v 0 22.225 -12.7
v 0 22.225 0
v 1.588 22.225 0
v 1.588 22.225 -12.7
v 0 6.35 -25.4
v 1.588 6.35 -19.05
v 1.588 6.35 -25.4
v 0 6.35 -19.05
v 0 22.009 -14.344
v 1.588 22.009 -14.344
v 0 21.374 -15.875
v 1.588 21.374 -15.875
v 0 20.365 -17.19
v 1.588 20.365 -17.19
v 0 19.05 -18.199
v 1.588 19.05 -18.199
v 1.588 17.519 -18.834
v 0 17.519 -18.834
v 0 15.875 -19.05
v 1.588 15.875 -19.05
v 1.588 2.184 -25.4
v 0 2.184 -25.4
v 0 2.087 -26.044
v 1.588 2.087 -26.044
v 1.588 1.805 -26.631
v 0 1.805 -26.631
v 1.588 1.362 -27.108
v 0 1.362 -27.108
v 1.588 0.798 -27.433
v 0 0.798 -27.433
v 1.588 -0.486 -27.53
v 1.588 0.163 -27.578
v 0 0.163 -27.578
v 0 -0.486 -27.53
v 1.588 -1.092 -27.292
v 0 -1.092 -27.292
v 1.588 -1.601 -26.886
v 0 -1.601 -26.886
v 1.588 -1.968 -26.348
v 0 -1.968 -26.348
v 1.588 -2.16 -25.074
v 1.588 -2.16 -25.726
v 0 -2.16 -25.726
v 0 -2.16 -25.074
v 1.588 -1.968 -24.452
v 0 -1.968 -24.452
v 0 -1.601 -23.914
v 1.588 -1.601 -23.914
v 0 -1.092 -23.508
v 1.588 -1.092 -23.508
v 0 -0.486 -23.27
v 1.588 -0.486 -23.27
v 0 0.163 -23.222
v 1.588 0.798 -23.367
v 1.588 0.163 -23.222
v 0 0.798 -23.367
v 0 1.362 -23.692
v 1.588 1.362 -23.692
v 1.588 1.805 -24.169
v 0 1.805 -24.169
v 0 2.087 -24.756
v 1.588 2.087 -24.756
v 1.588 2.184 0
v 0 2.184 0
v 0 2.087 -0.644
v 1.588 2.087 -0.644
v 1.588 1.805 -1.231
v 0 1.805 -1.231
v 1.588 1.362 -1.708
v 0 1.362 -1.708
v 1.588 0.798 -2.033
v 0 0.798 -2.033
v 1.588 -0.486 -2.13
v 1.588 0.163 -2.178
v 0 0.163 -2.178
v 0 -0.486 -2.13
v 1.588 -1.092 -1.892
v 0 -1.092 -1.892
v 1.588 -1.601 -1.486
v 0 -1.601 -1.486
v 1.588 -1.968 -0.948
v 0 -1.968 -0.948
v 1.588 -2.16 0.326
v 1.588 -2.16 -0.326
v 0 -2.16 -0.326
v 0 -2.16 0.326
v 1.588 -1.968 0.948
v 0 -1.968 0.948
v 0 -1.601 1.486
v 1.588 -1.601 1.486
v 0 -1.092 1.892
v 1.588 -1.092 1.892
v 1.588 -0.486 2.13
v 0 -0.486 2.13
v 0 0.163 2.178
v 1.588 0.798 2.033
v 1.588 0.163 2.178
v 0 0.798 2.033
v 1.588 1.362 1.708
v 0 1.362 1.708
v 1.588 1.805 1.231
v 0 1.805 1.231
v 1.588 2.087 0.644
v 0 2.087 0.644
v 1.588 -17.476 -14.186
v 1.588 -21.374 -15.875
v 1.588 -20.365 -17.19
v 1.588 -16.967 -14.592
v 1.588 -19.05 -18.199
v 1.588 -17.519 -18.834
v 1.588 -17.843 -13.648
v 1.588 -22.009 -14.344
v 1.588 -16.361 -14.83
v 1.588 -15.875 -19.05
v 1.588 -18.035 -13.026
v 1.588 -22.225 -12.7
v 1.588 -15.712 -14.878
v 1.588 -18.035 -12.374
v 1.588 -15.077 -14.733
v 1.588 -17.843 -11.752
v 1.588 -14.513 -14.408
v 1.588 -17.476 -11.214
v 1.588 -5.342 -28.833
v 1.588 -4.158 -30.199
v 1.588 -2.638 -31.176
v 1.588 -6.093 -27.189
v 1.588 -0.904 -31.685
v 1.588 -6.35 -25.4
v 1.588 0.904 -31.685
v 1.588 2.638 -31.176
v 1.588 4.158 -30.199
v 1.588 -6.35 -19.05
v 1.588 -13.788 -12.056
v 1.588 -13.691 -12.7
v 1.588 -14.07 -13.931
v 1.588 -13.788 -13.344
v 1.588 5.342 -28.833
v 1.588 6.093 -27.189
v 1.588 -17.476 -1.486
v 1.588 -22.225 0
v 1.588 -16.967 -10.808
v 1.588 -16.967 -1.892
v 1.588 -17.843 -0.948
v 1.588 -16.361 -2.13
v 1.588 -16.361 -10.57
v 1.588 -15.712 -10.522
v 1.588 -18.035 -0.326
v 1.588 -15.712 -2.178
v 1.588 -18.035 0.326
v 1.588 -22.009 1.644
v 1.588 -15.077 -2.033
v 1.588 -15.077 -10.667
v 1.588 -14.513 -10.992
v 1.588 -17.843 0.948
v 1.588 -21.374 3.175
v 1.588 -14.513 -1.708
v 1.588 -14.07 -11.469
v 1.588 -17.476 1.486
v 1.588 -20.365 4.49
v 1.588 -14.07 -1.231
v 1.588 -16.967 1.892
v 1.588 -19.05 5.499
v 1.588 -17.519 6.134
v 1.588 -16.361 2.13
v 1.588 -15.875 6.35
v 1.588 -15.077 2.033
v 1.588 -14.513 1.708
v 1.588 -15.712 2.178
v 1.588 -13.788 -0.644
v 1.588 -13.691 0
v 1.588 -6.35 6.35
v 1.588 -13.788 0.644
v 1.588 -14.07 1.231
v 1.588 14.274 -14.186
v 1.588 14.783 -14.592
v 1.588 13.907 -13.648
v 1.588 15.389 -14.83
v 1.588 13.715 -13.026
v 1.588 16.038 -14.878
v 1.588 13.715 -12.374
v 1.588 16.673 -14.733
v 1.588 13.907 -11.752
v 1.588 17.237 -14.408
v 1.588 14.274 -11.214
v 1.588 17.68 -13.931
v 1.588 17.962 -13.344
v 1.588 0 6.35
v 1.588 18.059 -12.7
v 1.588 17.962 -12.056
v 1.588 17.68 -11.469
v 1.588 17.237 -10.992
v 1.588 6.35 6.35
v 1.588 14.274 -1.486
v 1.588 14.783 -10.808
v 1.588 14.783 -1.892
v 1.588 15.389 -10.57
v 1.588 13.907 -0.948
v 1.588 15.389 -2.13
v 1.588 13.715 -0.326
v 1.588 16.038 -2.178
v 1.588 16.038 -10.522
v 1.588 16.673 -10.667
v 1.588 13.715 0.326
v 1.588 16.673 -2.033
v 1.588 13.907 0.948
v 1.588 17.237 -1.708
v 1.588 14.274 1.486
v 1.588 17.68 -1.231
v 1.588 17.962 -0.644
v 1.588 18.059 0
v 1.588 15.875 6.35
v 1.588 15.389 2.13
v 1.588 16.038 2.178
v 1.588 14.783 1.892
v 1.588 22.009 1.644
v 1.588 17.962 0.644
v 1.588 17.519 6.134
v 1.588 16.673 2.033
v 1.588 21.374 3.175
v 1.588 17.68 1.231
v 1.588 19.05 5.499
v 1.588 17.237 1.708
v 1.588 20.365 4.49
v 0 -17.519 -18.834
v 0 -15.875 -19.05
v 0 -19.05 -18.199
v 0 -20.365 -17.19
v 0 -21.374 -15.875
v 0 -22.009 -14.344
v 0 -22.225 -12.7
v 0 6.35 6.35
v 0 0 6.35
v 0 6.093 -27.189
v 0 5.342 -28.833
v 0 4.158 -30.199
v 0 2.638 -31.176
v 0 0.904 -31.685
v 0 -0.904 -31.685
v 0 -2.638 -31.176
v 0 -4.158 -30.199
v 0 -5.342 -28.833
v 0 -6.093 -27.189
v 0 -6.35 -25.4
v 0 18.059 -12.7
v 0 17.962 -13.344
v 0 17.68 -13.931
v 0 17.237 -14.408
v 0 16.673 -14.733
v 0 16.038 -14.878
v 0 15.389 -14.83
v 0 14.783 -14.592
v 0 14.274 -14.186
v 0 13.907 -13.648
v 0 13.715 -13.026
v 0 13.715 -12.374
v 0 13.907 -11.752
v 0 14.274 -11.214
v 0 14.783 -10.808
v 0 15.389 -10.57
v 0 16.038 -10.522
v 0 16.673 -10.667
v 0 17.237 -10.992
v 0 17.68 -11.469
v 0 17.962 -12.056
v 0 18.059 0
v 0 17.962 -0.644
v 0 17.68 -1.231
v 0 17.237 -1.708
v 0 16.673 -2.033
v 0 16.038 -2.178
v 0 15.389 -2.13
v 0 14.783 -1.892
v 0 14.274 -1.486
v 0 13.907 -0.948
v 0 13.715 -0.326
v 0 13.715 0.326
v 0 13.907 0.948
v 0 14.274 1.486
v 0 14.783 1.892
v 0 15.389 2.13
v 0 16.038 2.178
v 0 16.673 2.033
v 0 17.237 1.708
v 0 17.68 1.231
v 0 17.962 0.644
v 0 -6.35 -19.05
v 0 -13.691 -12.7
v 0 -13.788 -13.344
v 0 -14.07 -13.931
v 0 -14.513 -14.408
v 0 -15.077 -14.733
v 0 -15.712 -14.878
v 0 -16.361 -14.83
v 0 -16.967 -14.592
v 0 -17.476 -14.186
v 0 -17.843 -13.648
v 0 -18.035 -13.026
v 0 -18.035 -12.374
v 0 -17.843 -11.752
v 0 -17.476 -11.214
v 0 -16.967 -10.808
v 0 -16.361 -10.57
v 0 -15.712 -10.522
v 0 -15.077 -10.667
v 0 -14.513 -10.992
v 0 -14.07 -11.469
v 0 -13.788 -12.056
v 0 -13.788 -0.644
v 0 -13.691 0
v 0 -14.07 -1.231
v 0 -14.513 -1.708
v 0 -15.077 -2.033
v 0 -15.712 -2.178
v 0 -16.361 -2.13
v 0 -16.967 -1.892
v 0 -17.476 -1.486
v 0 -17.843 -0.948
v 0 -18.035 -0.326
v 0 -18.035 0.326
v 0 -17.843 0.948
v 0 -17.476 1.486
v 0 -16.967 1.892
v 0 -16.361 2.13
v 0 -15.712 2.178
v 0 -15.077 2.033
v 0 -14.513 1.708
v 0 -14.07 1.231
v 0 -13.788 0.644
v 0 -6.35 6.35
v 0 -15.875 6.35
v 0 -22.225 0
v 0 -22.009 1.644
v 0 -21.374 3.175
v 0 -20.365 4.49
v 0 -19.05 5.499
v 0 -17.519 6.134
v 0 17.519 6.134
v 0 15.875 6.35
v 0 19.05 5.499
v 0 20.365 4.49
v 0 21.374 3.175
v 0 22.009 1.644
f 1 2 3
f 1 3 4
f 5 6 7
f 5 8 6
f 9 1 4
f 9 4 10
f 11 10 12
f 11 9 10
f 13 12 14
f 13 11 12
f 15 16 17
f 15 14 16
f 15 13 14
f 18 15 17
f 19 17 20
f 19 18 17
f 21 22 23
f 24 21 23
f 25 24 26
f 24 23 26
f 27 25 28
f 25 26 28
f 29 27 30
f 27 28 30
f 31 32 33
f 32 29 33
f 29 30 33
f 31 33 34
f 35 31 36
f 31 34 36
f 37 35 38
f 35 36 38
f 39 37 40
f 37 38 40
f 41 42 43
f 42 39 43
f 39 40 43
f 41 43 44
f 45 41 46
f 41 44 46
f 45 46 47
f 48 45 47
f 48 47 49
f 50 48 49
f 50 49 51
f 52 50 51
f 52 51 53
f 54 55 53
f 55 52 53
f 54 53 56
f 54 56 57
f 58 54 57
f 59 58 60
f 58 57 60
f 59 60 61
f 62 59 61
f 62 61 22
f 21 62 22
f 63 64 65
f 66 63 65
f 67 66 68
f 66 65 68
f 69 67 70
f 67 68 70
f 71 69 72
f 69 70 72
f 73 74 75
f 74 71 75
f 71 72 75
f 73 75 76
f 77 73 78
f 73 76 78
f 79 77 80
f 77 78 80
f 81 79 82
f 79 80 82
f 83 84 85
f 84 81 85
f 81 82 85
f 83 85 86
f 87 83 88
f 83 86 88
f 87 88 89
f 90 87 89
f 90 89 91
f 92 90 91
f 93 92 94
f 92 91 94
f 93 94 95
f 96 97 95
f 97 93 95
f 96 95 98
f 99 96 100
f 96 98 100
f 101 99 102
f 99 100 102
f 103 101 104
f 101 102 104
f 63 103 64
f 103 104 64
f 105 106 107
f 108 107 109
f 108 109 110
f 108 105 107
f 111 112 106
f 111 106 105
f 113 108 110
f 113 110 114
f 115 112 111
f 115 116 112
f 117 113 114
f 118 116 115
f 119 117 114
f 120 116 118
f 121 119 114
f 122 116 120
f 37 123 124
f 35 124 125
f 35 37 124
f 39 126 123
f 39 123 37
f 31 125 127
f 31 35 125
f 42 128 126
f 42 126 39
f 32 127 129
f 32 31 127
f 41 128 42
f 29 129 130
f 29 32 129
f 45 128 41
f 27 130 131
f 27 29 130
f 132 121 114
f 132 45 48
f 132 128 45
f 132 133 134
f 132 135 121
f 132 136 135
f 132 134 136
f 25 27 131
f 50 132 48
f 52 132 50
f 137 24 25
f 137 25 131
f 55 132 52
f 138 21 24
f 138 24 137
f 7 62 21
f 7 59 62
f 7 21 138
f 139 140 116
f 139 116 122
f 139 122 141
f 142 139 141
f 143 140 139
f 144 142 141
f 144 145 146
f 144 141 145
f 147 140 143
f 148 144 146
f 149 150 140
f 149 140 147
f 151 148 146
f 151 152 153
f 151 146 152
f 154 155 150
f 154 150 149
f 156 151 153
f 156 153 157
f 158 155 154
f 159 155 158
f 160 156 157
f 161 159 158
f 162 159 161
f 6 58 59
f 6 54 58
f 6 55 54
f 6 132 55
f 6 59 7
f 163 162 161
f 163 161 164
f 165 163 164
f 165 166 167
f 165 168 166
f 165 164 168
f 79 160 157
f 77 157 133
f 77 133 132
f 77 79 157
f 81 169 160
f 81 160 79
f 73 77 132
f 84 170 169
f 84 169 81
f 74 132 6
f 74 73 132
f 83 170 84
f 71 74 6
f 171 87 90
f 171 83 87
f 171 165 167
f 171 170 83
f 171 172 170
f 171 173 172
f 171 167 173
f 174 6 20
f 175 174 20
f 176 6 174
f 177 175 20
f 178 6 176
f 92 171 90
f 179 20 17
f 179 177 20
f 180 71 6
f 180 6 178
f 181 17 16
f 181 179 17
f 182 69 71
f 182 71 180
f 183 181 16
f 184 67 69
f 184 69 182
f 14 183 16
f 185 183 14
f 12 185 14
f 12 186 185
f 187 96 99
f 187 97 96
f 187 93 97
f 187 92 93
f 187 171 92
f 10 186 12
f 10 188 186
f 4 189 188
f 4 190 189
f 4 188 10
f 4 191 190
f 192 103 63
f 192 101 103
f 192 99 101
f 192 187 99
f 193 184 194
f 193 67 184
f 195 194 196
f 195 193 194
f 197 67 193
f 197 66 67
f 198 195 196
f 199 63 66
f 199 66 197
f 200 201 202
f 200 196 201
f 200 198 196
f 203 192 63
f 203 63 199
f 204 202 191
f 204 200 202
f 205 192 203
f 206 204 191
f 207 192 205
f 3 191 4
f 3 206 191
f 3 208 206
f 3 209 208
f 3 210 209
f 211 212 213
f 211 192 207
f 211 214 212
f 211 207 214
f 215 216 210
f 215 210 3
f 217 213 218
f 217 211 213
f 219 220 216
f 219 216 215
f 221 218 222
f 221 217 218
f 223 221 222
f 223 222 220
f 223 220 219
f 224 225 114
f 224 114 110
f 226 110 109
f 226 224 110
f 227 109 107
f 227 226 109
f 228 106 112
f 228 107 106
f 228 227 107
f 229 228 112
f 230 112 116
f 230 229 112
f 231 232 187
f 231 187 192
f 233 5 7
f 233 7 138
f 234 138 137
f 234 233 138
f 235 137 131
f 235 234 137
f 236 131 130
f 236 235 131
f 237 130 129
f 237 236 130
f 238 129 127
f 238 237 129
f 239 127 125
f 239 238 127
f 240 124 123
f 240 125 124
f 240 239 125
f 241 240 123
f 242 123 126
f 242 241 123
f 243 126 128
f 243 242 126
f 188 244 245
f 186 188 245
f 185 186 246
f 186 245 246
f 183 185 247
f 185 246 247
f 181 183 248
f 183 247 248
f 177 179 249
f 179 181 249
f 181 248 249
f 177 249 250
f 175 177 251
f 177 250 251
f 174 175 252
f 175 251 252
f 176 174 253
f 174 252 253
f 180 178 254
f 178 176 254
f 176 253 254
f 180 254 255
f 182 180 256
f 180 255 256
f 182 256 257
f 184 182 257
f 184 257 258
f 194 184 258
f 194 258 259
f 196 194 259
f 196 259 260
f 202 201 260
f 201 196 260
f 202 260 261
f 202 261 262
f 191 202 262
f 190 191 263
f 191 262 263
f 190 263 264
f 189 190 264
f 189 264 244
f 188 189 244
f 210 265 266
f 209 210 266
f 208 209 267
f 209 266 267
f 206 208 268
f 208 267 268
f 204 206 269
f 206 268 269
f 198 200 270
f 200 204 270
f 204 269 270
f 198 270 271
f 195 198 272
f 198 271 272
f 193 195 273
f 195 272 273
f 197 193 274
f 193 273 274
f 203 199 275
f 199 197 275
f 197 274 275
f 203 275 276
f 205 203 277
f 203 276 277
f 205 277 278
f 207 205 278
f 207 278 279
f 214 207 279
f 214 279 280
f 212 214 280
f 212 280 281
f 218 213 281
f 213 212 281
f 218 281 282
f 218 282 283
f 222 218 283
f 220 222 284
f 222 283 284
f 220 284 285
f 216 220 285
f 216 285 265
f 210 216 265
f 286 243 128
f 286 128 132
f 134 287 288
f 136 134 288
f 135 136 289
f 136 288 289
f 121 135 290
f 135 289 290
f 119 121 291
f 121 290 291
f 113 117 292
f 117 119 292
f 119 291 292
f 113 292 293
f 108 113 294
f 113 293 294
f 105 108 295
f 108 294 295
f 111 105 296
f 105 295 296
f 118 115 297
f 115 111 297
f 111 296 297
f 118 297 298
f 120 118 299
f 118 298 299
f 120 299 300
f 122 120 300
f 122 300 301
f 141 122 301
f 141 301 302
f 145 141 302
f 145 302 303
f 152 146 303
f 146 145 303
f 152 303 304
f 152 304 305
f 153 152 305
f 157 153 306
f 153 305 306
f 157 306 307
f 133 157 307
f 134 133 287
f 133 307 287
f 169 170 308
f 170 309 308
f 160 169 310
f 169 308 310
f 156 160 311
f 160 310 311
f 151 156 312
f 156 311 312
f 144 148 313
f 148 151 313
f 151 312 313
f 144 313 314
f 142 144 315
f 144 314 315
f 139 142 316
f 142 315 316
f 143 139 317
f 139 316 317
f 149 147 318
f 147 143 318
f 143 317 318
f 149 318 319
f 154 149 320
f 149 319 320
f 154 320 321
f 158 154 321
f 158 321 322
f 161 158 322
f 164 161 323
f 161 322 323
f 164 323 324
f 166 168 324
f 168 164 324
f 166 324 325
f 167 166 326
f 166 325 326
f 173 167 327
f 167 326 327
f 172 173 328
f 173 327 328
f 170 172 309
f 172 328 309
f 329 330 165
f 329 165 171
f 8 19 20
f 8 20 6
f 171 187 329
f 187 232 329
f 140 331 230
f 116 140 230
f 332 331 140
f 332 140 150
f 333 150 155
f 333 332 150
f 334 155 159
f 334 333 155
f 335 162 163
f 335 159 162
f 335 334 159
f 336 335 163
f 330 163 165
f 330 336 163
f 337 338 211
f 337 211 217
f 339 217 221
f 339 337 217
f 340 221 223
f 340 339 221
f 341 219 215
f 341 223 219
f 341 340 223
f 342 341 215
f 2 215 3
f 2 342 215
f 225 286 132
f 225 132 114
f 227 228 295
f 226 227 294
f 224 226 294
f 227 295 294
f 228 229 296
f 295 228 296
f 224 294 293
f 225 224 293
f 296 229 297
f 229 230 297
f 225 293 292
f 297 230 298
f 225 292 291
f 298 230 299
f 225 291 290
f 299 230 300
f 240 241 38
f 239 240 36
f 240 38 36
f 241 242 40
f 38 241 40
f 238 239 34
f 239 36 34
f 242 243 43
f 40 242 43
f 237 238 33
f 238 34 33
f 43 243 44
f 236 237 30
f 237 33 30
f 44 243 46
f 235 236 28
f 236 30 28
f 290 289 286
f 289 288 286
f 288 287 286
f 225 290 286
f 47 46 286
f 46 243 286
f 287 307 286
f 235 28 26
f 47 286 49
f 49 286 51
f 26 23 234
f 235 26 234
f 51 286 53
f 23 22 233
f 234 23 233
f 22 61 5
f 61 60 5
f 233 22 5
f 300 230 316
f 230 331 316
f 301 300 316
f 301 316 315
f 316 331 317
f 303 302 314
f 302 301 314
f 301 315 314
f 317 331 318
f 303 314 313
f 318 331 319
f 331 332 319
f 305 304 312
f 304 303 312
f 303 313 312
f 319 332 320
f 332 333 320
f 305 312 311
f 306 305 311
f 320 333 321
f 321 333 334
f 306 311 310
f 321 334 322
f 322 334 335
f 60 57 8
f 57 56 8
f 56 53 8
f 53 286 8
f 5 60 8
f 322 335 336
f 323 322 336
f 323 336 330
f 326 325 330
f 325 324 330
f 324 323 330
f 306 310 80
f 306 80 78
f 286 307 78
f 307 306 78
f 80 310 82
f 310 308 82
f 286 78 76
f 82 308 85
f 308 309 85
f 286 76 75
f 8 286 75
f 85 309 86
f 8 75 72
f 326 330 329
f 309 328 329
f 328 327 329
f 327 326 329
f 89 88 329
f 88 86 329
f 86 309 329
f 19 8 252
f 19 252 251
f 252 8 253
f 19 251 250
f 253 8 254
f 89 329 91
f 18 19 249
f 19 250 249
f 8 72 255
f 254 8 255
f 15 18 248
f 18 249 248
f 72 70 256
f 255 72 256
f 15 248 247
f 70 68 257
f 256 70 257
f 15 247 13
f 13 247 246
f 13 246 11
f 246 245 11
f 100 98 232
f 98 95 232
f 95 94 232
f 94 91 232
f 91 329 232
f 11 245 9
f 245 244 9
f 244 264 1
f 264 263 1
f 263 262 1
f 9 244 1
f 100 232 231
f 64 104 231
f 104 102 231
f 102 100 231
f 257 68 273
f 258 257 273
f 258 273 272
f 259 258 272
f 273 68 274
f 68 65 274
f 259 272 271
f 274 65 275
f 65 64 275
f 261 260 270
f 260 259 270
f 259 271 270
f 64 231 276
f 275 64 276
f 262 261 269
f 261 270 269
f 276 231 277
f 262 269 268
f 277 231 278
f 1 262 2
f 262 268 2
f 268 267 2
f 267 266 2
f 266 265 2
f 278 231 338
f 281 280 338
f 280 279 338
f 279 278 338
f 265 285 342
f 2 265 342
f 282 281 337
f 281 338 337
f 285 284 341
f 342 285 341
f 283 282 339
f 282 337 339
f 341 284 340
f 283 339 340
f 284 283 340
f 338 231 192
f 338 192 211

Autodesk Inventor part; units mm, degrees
ref_plane "YZ Plane" through (0, 0, 0) normal (1, 0, 0) x (0, 1, 0)
ref_plane "XZ Plane" through (0, 0, 0) normal (0, 1, 0) x (-1, 0, 0)
ref_plane "XY Plane" through (0, 0, 0) normal (0, 0, 1) x (1, 0, 0)
sketch "Sketch1" plane through (0, 0, 0) normal (1, 0, 0) x (0, 1, 0)
  arc A0 (-6.35, -25.4) -> (6.35, -25.4) centre (0, -25.4) ccw
  line L0 (-6.35, -19.05) -> (-15.875, -19.05)
  circle A1 centre (-15.875, -12.7) radius 2.1844
  arc A2 (-22.225, -12.7) -> (-15.875, -19.05) centre (-15.875, -12.7) ccw
  line L1 (-6.35, -25.4) -> (-6.35, -19.05)
  circle A3 centre (15.875, -12.7) radius 2.1844
  arc A4 (15.875, -19.05) -> (22.225, -12.7) centre (15.875, -12.7) ccw
  line L2 (15.875, -19.05) -> (6.35, -19.05)
  line L3 (6.35, -19.05) -> (6.35, -25.4)
  circle A5 centre (0, 0) radius 2.1844
  circle A6 centre (0, -25.4) radius 2.1844
  line L4 (0, 6.35) -> (6.35, 6.35)
  line L5 (0, 6.35) -> (-6.35, 6.35)
  line L6 (-15.875, 6.35) -> (15.875, 6.35)
  line L7 (22.225, 0) -> (22.225, -12.7)
  line L8 (-6.35, 6.35) -> (-15.875, 6.35)
  line L9 (-22.225, 0) -> (-22.225, -12.7)
  circle A7 centre (15.875, 0) radius 2.1844
  circle A8 centre (-15.875, 0) radius 2.1844
  arc A9 (-15.875, 6.35) -> (-22.225, 0) centre (-15.875, 0) ccw
  arc A10 (22.225, 0) -> (15.875, 6.35) centre (15.875, 0) ccw
  dimension "d22" = 4.3688
  dimension "d23" = 4.3688
  dimension "d25" = 4.3688
  dimension "d27" = 4.3688
  dimension "d28" = 6.35
extrude "Extrusion1" add sketch "Sketch1" along normal blind 1.5875
properties part number "polygusset"
